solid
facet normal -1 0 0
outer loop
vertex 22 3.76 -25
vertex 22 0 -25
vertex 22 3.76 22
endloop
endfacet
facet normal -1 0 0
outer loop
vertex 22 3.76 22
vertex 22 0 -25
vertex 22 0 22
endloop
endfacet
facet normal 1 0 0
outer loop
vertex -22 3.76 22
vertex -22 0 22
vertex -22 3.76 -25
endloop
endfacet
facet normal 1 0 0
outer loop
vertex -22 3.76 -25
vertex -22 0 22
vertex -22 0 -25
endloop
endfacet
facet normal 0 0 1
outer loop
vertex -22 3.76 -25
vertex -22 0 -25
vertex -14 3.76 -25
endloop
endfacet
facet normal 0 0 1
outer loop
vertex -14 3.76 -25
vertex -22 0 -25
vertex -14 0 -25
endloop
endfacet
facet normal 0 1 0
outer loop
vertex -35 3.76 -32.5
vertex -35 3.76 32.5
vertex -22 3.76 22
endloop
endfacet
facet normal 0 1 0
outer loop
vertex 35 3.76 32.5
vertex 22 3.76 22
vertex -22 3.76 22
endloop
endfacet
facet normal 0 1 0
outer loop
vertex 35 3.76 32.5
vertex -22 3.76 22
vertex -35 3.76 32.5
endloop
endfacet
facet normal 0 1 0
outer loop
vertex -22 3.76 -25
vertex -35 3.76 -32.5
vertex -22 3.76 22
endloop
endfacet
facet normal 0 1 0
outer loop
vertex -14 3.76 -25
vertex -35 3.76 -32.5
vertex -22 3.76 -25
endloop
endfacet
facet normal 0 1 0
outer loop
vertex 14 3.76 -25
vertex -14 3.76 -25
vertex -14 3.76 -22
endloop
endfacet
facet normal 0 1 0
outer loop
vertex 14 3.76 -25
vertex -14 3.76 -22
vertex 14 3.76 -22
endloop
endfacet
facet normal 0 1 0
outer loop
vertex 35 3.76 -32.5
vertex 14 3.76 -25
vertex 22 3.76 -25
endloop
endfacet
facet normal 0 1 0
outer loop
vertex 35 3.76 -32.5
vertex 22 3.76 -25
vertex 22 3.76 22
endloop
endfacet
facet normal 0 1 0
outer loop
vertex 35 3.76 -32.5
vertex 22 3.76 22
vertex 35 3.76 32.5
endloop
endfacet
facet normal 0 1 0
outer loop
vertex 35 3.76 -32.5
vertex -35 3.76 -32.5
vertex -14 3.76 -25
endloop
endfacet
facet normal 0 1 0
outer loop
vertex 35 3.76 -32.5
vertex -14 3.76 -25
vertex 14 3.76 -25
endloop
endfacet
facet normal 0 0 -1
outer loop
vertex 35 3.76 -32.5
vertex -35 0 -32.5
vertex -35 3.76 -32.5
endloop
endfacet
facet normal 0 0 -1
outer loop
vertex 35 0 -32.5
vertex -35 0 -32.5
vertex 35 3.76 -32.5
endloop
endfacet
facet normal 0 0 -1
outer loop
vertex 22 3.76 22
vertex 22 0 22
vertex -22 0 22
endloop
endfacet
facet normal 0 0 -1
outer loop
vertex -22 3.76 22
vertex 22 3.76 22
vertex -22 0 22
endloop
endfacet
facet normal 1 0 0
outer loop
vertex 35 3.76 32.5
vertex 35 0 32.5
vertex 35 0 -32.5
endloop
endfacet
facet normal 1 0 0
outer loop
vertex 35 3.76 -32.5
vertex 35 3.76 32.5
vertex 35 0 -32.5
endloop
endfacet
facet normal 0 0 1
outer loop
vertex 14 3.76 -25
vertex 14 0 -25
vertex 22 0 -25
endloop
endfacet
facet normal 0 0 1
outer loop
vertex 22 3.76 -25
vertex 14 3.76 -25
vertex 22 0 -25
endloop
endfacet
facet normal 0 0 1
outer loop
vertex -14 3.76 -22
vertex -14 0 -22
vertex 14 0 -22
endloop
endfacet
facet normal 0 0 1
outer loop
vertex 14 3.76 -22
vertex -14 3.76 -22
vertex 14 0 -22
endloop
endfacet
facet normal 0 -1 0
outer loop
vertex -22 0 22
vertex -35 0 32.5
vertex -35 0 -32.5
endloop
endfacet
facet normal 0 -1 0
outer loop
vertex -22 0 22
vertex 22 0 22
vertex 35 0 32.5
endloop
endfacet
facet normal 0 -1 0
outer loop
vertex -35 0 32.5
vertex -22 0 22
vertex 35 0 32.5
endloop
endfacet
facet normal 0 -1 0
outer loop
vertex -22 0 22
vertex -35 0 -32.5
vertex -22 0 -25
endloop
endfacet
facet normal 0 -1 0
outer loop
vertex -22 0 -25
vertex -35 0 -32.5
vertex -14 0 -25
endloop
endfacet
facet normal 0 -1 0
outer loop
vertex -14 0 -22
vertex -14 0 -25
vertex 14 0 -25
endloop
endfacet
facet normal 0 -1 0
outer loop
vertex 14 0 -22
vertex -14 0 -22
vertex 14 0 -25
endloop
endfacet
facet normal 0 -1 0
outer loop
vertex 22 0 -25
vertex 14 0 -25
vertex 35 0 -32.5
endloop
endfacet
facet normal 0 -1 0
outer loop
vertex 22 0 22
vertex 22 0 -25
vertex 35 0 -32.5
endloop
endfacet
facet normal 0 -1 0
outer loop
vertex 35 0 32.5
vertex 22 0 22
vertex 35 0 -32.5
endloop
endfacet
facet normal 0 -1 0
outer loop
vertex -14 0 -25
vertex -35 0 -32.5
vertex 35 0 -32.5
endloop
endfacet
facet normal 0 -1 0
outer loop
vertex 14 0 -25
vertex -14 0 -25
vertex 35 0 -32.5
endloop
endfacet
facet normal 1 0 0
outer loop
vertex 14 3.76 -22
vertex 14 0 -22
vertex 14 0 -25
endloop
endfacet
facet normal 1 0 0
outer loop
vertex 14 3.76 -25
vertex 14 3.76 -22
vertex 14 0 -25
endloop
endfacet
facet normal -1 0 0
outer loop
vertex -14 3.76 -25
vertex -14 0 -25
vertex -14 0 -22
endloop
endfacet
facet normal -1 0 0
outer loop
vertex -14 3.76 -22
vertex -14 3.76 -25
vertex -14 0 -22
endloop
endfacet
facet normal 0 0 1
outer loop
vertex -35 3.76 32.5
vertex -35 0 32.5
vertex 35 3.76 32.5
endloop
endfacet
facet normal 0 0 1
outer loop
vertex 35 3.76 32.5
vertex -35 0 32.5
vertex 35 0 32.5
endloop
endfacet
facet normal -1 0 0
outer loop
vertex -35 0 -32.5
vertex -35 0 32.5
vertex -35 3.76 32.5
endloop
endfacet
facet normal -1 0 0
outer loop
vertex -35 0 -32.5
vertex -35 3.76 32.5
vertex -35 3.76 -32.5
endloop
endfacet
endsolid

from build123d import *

# Parameters (mm, degrees)
SCHIZZO1_W                   = 70
SCHIZZO1_H                   = 65
ESTRUSIONE_ESTRUSIONE1_DEPTH = 3.76


with BuildPart() as part:
    # Schizzo1 → Estrusione-Estrusione1 (new body)
    with BuildSketch(Plane(origin=(0, 0, 0), x_dir=(1, 0, 0), z_dir=(0, 1, 0))):
        Rectangle(SCHIZZO1_W, SCHIZZO1_H)
        Polygon((-22, -22), (-22, 22), (-22, 25), (-14, 25), (-14, 22), (14, 22), (14, 25), (22, 25), (22, 22), (22, -22), align=None, mode=Mode.SUBTRACT)
    extrude(amount=ESTRUSIONE_ESTRUSIONE1_DEPTH)


solid = part.part
